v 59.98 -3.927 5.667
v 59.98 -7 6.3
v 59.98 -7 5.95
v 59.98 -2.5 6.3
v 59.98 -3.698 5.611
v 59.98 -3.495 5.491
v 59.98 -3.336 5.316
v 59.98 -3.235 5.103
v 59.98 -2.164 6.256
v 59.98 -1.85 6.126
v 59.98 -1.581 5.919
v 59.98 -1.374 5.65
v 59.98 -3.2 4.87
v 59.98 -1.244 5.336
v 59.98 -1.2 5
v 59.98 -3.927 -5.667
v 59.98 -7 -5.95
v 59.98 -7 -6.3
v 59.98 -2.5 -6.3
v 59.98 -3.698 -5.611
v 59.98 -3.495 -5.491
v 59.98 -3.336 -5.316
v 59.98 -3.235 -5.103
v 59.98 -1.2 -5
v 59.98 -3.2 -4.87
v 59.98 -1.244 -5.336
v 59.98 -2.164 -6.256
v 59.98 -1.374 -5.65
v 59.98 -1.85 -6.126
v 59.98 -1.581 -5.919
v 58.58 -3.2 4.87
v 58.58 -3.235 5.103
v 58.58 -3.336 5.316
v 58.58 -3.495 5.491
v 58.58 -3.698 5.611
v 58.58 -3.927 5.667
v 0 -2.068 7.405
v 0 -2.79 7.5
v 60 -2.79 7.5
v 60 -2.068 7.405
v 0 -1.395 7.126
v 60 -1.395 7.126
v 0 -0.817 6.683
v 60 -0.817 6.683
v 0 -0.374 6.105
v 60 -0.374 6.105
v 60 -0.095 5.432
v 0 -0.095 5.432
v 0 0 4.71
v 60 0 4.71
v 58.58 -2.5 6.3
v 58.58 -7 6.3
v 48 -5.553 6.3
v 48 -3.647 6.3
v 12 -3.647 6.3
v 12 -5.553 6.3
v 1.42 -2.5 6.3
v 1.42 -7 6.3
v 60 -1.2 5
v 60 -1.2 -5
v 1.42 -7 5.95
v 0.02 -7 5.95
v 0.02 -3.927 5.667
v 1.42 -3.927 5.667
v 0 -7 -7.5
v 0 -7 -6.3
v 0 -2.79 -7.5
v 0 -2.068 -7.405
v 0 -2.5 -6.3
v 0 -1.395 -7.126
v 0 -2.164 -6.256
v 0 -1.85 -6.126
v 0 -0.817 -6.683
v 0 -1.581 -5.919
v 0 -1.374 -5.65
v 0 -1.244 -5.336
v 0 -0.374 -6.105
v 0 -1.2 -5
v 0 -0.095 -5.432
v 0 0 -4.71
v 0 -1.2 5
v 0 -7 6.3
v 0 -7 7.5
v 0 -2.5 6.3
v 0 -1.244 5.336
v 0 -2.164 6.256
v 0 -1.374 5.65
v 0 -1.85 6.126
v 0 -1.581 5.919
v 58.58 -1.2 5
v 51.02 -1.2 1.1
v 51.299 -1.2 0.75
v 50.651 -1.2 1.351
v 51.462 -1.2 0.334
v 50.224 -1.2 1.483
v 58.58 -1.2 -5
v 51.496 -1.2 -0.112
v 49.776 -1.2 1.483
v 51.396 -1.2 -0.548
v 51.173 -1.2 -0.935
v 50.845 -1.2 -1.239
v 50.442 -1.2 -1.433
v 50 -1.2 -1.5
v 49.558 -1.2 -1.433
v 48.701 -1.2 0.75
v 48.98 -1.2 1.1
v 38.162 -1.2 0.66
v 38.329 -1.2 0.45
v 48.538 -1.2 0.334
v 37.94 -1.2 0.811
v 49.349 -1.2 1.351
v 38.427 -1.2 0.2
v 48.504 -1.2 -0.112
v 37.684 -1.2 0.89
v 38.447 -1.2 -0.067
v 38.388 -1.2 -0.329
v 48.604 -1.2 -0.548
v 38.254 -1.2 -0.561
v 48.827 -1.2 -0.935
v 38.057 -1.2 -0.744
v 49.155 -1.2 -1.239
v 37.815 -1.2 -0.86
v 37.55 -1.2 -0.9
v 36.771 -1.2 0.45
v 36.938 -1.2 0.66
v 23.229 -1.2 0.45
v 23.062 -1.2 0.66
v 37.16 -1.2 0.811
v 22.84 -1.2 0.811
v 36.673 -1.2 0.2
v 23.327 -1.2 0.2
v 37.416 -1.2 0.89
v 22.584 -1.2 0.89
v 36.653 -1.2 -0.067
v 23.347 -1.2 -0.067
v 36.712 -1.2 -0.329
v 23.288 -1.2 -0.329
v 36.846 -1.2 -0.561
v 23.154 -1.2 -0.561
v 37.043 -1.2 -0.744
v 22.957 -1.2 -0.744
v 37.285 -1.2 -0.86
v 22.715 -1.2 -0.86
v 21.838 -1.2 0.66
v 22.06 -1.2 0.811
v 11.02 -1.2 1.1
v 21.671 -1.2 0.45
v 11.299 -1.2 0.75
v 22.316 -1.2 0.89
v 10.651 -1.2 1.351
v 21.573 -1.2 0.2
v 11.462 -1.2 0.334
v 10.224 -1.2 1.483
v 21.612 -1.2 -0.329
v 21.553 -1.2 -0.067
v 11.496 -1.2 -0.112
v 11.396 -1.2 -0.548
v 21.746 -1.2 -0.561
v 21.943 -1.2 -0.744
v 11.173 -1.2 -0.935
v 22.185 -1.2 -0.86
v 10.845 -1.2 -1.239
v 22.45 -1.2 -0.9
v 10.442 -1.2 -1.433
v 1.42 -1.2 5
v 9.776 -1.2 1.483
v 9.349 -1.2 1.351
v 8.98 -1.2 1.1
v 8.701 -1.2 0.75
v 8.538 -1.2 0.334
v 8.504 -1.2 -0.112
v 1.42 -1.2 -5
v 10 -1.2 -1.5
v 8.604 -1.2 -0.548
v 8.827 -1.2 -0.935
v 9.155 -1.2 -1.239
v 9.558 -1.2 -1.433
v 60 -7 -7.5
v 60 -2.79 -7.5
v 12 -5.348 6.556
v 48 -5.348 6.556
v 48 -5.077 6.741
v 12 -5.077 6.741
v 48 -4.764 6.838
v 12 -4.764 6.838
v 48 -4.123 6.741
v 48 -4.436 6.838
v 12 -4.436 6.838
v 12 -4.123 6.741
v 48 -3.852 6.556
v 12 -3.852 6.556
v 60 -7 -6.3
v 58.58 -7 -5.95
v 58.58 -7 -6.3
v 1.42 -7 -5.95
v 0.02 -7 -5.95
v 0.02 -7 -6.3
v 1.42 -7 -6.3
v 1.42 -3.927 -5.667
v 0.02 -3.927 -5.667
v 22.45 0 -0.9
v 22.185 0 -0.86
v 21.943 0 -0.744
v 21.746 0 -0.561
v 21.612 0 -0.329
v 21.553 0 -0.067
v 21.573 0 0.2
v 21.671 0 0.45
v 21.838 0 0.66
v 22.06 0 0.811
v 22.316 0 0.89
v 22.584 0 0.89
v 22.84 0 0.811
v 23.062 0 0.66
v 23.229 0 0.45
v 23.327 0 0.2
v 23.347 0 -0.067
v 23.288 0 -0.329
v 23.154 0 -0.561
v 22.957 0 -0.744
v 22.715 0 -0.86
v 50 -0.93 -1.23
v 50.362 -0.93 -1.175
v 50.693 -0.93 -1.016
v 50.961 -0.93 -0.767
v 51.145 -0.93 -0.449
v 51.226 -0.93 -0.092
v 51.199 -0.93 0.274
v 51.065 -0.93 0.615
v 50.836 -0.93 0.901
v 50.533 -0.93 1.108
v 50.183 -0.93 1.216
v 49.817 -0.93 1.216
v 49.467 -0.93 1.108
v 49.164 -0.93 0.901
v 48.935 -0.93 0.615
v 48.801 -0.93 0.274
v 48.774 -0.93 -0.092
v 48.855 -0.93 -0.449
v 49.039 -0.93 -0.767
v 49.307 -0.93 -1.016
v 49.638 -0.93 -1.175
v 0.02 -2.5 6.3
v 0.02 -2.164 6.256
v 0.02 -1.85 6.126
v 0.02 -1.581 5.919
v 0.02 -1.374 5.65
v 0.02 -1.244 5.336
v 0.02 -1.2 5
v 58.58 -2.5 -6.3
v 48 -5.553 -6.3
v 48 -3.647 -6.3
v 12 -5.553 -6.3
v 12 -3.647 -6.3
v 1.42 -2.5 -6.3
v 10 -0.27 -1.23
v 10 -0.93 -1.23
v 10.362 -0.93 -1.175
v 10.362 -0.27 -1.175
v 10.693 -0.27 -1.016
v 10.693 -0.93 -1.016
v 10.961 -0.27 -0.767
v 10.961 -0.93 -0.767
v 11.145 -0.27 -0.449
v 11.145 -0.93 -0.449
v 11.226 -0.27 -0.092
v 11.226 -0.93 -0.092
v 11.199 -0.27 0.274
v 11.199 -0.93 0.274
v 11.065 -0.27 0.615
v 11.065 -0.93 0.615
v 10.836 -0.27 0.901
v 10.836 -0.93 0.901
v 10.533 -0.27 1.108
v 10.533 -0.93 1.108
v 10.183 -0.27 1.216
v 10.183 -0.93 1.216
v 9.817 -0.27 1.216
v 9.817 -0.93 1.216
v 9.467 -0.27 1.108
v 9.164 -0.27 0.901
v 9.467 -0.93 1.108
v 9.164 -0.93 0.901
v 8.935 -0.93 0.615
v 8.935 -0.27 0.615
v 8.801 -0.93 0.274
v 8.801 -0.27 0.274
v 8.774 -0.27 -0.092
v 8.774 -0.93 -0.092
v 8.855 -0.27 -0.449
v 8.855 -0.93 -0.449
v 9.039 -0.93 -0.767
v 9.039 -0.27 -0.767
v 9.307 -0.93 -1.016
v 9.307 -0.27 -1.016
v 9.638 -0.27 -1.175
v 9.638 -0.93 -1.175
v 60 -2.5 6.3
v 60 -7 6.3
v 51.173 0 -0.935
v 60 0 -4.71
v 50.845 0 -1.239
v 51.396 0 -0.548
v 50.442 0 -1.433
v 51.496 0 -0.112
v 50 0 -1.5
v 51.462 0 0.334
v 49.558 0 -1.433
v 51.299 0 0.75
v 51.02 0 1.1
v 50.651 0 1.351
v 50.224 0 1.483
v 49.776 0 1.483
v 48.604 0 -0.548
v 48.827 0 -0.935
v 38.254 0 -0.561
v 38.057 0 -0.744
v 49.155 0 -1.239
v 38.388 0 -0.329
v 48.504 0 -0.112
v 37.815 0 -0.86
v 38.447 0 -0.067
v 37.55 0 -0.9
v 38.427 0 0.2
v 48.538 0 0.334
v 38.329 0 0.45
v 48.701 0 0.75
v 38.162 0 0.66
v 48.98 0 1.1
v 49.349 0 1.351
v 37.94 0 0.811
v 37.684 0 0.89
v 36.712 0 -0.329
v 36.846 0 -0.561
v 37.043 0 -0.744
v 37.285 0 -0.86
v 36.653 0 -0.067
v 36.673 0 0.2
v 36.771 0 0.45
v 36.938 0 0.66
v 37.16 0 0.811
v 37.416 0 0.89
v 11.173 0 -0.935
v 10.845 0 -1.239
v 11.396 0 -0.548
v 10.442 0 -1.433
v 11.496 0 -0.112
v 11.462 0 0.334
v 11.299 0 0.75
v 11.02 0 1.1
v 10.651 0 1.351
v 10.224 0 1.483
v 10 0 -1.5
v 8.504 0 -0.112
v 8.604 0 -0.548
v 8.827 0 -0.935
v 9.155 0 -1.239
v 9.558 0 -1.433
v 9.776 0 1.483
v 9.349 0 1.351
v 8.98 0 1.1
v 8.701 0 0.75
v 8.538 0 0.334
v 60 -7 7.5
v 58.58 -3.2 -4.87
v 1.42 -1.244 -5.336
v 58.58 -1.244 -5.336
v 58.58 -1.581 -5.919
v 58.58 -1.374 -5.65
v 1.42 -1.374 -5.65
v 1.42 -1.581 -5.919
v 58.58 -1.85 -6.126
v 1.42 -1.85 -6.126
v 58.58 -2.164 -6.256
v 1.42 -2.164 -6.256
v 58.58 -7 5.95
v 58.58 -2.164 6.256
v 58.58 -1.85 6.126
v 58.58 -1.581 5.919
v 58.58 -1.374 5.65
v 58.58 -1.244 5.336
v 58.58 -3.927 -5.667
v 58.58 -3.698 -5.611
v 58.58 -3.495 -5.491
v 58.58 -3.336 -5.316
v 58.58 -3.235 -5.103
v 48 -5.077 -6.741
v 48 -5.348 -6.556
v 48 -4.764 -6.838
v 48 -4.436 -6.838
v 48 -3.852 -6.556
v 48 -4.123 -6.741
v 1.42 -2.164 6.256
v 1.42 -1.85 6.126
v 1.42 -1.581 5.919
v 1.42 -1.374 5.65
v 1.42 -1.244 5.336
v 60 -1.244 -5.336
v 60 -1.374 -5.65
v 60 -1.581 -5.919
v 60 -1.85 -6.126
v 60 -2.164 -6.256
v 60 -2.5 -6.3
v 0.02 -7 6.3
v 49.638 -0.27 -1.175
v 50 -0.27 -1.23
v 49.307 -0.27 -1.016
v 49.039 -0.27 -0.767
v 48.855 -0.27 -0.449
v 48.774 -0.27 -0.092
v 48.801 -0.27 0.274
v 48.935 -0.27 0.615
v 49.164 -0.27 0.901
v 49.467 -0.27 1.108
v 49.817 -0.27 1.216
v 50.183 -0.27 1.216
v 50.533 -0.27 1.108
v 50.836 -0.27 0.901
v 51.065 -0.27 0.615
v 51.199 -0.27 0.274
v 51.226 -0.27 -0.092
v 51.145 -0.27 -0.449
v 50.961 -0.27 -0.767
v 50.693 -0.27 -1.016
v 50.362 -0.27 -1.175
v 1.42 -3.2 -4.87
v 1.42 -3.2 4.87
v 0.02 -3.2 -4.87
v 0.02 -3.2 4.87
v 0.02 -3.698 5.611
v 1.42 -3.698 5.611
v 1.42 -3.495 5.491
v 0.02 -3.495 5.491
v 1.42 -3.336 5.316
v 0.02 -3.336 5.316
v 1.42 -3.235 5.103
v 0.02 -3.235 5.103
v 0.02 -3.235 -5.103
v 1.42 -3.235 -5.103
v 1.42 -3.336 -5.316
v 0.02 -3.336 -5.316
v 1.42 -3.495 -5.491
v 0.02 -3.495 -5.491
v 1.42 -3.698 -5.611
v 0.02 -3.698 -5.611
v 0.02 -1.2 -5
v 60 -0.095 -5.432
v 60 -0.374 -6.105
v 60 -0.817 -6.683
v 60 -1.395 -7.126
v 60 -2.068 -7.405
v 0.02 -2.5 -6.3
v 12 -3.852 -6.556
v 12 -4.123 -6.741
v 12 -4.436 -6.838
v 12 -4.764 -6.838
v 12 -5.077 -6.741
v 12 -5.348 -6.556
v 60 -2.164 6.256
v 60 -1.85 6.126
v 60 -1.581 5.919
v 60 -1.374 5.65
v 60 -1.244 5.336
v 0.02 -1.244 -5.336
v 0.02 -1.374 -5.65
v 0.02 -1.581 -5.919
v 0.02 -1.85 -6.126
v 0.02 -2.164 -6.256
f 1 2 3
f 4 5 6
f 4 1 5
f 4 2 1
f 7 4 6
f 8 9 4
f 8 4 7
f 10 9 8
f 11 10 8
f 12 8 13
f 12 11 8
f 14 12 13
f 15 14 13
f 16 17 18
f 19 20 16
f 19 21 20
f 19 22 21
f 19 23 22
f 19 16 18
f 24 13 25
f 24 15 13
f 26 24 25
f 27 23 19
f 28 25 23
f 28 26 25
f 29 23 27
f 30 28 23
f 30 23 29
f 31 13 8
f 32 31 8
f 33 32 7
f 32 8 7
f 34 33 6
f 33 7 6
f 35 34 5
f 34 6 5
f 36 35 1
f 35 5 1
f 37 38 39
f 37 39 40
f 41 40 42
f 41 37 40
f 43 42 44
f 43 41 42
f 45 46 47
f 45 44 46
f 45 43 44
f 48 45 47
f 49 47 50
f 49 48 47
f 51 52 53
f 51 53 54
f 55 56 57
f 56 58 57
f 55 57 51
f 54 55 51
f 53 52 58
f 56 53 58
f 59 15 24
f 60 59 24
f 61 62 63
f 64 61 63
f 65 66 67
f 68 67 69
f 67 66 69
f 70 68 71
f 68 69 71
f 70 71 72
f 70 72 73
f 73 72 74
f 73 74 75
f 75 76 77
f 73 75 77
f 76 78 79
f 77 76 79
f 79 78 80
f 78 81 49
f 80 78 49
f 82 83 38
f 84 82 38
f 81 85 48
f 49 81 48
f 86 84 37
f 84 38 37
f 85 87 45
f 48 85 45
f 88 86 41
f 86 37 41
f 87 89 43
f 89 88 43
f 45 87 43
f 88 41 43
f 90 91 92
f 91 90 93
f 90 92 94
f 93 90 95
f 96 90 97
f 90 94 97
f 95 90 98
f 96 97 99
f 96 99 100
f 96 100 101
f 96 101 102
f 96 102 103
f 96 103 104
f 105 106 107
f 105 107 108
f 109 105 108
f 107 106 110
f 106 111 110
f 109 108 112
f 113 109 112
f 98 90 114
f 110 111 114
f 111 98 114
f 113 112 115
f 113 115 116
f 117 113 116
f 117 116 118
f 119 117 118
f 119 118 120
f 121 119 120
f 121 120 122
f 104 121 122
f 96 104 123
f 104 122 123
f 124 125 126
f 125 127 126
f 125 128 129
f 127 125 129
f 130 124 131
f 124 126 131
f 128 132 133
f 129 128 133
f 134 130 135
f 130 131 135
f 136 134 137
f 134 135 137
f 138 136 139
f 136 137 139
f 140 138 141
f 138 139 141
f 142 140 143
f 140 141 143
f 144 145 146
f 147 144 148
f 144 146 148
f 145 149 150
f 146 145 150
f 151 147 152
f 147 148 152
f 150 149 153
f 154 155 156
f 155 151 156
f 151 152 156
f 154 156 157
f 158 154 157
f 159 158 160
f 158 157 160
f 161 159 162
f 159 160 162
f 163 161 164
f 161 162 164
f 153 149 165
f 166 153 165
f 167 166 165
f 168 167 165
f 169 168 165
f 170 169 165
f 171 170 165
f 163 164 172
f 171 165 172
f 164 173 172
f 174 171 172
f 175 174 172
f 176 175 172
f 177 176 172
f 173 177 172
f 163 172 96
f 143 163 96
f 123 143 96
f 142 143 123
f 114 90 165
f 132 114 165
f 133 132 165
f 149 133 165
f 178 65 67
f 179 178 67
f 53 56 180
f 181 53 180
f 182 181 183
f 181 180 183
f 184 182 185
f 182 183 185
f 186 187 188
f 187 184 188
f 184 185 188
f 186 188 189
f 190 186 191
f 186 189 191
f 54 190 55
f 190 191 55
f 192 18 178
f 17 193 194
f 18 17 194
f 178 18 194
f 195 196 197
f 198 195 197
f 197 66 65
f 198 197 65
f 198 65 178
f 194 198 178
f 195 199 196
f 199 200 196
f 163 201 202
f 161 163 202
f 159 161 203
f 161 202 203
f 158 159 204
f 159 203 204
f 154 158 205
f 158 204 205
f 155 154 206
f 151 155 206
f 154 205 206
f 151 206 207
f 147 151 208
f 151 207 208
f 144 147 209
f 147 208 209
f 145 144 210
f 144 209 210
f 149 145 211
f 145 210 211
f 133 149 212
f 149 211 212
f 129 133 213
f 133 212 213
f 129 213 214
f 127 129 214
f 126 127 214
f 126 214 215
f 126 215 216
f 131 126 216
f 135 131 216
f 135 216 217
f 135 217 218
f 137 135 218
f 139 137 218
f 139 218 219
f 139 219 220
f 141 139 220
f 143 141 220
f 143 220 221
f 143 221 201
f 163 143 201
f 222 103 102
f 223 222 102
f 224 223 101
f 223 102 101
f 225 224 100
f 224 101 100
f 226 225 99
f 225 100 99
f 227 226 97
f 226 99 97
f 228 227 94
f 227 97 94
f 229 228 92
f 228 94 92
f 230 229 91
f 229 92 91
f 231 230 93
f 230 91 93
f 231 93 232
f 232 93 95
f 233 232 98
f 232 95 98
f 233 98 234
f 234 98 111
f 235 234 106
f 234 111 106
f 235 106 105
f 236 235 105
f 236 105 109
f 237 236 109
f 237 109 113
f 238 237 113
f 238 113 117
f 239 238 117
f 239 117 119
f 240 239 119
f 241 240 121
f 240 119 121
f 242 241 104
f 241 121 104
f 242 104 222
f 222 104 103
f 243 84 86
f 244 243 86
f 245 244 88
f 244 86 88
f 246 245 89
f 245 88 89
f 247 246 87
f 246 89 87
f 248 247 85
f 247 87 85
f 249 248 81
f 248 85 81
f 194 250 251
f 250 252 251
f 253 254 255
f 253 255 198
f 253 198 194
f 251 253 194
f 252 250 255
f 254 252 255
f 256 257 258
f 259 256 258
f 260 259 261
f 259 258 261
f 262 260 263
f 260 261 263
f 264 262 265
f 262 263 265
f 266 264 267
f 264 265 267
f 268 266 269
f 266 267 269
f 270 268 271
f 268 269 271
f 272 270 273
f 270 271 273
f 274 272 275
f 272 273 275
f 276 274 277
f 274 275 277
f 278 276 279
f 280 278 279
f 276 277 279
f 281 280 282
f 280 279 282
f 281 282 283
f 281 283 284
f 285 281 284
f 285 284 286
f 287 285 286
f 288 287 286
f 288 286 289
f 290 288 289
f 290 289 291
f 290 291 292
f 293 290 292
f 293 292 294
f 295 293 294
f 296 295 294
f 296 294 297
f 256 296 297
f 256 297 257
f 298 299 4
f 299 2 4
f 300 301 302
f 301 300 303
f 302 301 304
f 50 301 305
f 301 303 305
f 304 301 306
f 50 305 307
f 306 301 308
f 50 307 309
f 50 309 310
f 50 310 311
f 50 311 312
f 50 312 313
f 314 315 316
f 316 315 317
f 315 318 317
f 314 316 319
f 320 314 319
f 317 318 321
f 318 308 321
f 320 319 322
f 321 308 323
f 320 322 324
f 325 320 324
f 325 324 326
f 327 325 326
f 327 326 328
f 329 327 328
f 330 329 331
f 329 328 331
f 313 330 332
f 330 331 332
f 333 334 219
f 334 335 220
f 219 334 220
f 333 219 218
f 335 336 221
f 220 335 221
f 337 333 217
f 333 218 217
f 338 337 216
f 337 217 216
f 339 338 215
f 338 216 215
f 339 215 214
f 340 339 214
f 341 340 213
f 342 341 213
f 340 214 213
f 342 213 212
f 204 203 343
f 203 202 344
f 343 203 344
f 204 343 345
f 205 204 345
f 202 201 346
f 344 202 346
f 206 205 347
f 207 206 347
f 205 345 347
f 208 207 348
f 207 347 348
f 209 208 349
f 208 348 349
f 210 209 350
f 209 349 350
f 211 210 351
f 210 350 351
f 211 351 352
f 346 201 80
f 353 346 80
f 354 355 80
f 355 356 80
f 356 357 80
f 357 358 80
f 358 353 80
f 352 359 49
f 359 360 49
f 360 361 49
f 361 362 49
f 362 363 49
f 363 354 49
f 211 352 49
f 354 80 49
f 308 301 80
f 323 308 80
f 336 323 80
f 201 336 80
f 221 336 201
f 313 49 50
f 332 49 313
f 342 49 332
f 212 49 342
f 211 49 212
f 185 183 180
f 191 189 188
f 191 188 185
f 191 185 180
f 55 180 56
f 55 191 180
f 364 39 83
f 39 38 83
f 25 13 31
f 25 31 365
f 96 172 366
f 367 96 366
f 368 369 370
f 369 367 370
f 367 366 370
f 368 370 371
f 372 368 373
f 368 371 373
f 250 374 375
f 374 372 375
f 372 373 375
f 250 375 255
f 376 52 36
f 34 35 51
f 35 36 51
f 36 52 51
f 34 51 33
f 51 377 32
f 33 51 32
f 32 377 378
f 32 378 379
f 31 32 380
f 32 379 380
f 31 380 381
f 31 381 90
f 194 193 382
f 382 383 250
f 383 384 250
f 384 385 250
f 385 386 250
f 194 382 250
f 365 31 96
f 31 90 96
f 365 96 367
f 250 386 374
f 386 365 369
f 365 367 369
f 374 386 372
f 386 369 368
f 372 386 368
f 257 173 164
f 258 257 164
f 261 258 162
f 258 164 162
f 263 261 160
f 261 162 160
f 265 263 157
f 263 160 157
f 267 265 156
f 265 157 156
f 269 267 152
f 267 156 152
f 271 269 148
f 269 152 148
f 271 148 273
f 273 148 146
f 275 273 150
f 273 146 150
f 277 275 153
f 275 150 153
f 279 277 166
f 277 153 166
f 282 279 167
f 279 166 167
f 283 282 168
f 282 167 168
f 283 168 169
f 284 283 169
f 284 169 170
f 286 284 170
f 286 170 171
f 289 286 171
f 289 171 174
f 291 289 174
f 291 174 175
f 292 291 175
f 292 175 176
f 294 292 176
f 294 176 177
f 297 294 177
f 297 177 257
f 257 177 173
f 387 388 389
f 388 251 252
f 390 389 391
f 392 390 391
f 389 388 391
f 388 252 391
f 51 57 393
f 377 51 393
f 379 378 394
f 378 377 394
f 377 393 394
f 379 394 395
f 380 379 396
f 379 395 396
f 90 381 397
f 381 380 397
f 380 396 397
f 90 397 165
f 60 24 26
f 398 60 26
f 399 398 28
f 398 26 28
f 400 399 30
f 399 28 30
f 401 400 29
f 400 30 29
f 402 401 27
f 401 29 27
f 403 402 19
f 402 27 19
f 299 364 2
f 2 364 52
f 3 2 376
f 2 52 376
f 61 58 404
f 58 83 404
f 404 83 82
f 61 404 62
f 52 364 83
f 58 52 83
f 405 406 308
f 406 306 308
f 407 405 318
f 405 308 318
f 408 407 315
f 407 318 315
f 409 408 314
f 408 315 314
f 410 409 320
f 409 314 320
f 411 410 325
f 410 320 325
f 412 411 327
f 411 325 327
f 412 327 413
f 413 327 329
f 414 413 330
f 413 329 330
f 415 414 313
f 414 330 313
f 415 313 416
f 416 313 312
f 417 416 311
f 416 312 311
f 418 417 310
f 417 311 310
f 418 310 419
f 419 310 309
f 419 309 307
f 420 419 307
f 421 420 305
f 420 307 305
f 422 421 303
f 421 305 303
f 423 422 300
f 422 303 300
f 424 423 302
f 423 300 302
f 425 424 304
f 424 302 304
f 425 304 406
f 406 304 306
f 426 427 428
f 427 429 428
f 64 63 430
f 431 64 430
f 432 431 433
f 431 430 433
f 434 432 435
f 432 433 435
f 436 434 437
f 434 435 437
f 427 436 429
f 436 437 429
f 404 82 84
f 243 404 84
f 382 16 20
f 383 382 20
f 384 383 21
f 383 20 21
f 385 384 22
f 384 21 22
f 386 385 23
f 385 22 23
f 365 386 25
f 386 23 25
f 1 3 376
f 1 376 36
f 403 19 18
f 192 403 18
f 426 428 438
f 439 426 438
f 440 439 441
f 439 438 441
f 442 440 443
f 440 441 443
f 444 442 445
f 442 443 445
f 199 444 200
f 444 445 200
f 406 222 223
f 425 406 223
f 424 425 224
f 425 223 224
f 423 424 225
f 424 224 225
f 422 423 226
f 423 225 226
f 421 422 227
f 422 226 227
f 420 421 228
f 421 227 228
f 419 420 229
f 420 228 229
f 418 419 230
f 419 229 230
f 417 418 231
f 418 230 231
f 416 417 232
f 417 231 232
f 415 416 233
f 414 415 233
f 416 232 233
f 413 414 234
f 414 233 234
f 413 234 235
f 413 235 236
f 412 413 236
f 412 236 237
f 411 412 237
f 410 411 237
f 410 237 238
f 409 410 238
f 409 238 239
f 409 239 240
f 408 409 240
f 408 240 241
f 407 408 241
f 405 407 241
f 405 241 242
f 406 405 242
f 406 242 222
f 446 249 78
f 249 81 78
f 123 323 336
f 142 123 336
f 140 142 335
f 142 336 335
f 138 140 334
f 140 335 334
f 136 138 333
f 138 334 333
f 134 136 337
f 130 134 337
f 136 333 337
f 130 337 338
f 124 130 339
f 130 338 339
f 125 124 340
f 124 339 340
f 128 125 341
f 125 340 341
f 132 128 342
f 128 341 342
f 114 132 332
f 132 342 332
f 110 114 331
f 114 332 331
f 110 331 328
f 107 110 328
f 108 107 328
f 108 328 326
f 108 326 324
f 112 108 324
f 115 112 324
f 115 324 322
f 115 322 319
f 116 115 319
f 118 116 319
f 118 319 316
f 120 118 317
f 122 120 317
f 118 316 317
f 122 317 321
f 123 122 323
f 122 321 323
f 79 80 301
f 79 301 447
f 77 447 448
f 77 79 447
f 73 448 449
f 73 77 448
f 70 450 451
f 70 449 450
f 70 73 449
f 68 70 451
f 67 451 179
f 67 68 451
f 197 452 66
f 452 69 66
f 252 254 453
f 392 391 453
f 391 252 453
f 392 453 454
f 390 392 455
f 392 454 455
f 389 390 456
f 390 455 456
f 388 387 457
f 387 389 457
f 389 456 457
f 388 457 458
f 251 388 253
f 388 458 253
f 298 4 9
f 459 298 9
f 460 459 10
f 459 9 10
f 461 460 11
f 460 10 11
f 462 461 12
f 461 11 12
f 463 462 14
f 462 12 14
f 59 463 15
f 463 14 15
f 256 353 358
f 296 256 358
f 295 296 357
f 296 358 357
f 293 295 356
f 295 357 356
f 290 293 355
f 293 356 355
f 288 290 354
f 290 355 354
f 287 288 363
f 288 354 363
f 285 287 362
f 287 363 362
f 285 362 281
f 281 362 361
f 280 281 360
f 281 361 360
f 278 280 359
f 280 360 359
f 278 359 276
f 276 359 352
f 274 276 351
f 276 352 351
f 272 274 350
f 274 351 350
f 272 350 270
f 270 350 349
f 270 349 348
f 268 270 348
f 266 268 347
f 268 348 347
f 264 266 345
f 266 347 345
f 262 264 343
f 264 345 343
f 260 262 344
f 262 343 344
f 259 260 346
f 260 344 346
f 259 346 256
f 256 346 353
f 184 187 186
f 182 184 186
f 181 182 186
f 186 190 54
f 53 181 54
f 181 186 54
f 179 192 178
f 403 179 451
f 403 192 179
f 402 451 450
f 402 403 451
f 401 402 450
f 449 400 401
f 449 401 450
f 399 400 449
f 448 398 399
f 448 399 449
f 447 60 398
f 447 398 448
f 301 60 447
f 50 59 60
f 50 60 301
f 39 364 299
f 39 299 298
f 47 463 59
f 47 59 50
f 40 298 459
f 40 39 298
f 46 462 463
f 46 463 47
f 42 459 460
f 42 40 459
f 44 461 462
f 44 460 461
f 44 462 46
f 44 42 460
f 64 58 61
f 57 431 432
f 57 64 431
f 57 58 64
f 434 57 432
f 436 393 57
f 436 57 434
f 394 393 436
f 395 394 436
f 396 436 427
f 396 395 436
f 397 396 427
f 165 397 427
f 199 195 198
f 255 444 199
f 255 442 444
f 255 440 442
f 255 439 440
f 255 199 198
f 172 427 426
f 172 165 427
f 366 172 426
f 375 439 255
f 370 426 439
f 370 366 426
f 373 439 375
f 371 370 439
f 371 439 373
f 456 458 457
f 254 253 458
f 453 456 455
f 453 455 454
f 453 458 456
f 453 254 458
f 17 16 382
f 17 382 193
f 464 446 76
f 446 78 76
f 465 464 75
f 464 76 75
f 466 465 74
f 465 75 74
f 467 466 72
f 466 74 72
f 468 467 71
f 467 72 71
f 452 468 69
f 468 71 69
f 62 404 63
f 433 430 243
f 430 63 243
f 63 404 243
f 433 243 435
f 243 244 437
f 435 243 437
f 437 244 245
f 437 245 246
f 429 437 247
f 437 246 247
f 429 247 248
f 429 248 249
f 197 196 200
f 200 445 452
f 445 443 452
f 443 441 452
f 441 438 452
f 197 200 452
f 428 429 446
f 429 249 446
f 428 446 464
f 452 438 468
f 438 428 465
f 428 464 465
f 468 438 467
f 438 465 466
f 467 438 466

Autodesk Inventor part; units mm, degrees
sketch "Sketch_1" plane through (0, 0, 0) normal (1, 0, 0) x (0, 1, 0)
  line L0 (-7, 7.5) -> (-7, 6.3)
  line L1 (-7, 6.3) -> (-2.5, 6.3)
  arc A0 (-1.2, 5) -> (-2.5, 6.3) centre (-2.5, 5) ccw
  line L2 (-1.2, 5) -> (-1.2, -5)
  arc A1 (-2.5, -6.3) -> (-1.2, -5) centre (-2.5, -5) ccw
  line L3 (-2.5, -6.3) -> (-7, -6.3)
  line L4 (-7, -6.3) -> (-7, -7.5)
  line L5 (-7, -7.5) -> (-2.79, -7.5)
  arc A2 (-2.79, -7.5) -> (0, -4.71) centre (-2.79, -4.71) ccw
  line L6 (0, -4.71) -> (0, 4.71)
  arc A3 (0, 4.71) -> (-2.79, 7.5) centre (-2.79, 4.71) ccw
  line L7 (-2.79, 7.5) -> (-7, 7.5)
extrude "Extrusion1" add sketch "Sketch_1" along normal blind 60
sketch "Sketch_2" plane through (0.02, 0, 0) normal (1, 0, 0) x (0, 0, -1)
  line L0 (-6.3, -7) -> (-5.95, -7)
  line L1 (-5.95, -7) -> (-5.6669, -3.9266)
  arc A0 (-4.8703, -3.2) -> (-5.6669, -3.9266) centre (-4.8703, -4) ccw
  line L2 (-4.8703, -3.2) -> (4.8703, -3.2)
  arc A1 (5.6669, -3.9266) -> (4.8703, -3.2) centre (4.8703, -4) ccw
  line L3 (5.6669, -3.9266) -> (5.95, -7)
  line L4 (5.95, -7) -> (6.3, -7)
  line L5 (6.3, -7) -> (6.3, -2.5)
  arc A2 (6.3, -2.5) -> (5, -1.2) centre (5, -2.5) ccw
  line L6 (5, -1.2) -> (-5, -1.2)
  arc A3 (-5, -1.2) -> (-6.3, -2.5) centre (-5, -2.5) ccw
  line L7 (-6.3, -2.5) -> (-6.3, -7)
extrude "Extrusion2" add sketch "Sketch_2" along normal blind 1.4
sketch "Sketch_3" plane through (59.98, 0, 0) normal (1, 0, 0) x (0, 0, -1)
  line L0 (-6.3, -7) -> (-5.95, -7)
  line L1 (-5.95, -7) -> (-5.6669, -3.9266)
  arc A0 (-4.8703, -3.2) -> (-5.6669, -3.9266) centre (-4.8703, -4) ccw
  line L2 (-4.8703, -3.2) -> (4.8703, -3.2)
  arc A1 (5.6669, -3.9266) -> (4.8703, -3.2) centre (4.8703, -4) ccw
  line L3 (5.6669, -3.9266) -> (5.95, -7)
  line L4 (5.95, -7) -> (6.3, -7)
  line L5 (6.3, -7) -> (6.3, -2.5)
  arc A2 (6.3, -2.5) -> (5, -1.2) centre (5, -2.5) ccw
  line L6 (5, -1.2) -> (-5, -1.2)
  arc A3 (-5, -1.2) -> (-6.3, -2.5) centre (-5, -2.5) ccw
  line L7 (-6.3, -2.5) -> (-6.3, -7)
extrude "Extrusion3" add sketch "Sketch_3" against normal blind 1.4
sketch "Sketch_4" plane through (10, 0, 0) normal (1, 0, 0) x (0, 0, -1)
  line L0 (0, -1.2) -> (0, 0)
  line L1 (0, 0) -> (1.5, 0)
  line L2 (1.5, 0) -> (1.2295, -0.2705)
  line L3 (1.2295, -0.2705) -> (1.2295, -0.9295)
  line L4 (1.2295, -0.9295) -> (1.5, -1.2)
  line L5 (1.5, -1.2) -> (0, -1.2)
  line L6 (0, -1.2) -> (0, 0)
revolve "Revolution1" cut sketch "Sketch_4" angle 360 about axis through (10, -1.2, 0) along (0, -1, 0)
thread "Thread1" size "M3x0.5" class "6H" standard "ISO Metric profile" full length
sketch "Sketch_5" plane through (50, 0, 0) normal (1, 0, 0) x (0, 0, -1)
  line L0 (0, -1.2) -> (0, 0)
  line L1 (0, 0) -> (1.5, 0)
  line L2 (1.5, 0) -> (1.2295, -0.2705)
  line L3 (1.2295, -0.2705) -> (1.2295, -0.9295)
  line L4 (1.2295, -0.9295) -> (1.5, -1.2)
  line L5 (1.5, -1.2) -> (0, -1.2)
  line L6 (0, -1.2) -> (0, 0)
revolve "Revolution2" cut sketch "Sketch_5" angle 360 about axis through (50, -1.2, 0) along (0, -1, 0)
thread "Thread2" size "M3x0.5" class "6H" standard "ISO Metric profile" full length
sketch "Sketch6" plane through (1.42, -1.2, -5) normal (0, -1, 0) x (1, 0, 0)
  point P0 (36.13, 5)
hole "Hole1" at (37.55, -1.2, 0) direction (0, 1, 0) diameter 1.8 depth 1.2
sketch "Sketch7" plane through (1.42, -1.2, -5) normal (0, -1, 0) x (1, 0, 0)
  point P0 (21.03, 5)
hole "Hole2" at (22.45, -1.2, 0) direction (0, 1, 0) diameter 1.8 depth 1.2
sketch "Sketch_9" plane through (30, 0, 0) normal (1, 0, 0) x (0, 0, -1)
  arc A0 (-5.75, -3.5) -> (-5.75, -5.7) centre (-5.75, -4.6) ccw
  line L0 (-5.75, -5.7) -> (-5.75, -3.5)
extrude "Extrusion4" cut sketch "Sketch_9" along normal mid plane 36
sketch "Sketch_10" plane through (30, 0, 0) normal (1, 0, 0) x (0, 0, -1)
  line L0 (5.75, -3.5) -> (5.75, -5.7)
  arc A0 (5.75, -5.7) -> (5.75, -3.5) centre (5.75, -4.6) ccw
extrude "Extrusion5" cut sketch "Sketch_10" along normal mid plane 36
ref_plane "bspg_1_XY" through (30, -4.6, 0) normal (1, 0, 0) x (0, 0, -1)
ref_plane "bspg_1_YZ" through (30, -4.6, 0) normal (0, 0, -1) x (0, 1, 0)
ref_plane "bspg_1_ZX" through (30, -4.6, 0) normal (0, 1, 0) x (1, 0, 0)
ref_plane "bspg_1r_XY" through (30, -3.5, 0) normal (1, 0, 0) x (0, 0, -1)
ref_plane "bspg_1r_YZ" through (30, -3.5, 0) normal (0, 0, -1) x (0, 1, 0)
ref_plane "bspg_1r_ZX" through (30, -3.5, 0) normal (0, 1, 0) x (1, 0, 0)
ref_plane "bspg_d_XY" through (0, 0, 0) normal (0, 1, 0) x (1, 0, 0)
ref_plane "bspg_d_YZ" through (0, 0, 0) normal (1, 0, 0) x (0, 0, -1)
ref_plane "bspg_d_ZX" through (0, 0, 0) normal (0, 0, -1) x (0, 1, 0)
properties part number "BSPG1560 Table"
